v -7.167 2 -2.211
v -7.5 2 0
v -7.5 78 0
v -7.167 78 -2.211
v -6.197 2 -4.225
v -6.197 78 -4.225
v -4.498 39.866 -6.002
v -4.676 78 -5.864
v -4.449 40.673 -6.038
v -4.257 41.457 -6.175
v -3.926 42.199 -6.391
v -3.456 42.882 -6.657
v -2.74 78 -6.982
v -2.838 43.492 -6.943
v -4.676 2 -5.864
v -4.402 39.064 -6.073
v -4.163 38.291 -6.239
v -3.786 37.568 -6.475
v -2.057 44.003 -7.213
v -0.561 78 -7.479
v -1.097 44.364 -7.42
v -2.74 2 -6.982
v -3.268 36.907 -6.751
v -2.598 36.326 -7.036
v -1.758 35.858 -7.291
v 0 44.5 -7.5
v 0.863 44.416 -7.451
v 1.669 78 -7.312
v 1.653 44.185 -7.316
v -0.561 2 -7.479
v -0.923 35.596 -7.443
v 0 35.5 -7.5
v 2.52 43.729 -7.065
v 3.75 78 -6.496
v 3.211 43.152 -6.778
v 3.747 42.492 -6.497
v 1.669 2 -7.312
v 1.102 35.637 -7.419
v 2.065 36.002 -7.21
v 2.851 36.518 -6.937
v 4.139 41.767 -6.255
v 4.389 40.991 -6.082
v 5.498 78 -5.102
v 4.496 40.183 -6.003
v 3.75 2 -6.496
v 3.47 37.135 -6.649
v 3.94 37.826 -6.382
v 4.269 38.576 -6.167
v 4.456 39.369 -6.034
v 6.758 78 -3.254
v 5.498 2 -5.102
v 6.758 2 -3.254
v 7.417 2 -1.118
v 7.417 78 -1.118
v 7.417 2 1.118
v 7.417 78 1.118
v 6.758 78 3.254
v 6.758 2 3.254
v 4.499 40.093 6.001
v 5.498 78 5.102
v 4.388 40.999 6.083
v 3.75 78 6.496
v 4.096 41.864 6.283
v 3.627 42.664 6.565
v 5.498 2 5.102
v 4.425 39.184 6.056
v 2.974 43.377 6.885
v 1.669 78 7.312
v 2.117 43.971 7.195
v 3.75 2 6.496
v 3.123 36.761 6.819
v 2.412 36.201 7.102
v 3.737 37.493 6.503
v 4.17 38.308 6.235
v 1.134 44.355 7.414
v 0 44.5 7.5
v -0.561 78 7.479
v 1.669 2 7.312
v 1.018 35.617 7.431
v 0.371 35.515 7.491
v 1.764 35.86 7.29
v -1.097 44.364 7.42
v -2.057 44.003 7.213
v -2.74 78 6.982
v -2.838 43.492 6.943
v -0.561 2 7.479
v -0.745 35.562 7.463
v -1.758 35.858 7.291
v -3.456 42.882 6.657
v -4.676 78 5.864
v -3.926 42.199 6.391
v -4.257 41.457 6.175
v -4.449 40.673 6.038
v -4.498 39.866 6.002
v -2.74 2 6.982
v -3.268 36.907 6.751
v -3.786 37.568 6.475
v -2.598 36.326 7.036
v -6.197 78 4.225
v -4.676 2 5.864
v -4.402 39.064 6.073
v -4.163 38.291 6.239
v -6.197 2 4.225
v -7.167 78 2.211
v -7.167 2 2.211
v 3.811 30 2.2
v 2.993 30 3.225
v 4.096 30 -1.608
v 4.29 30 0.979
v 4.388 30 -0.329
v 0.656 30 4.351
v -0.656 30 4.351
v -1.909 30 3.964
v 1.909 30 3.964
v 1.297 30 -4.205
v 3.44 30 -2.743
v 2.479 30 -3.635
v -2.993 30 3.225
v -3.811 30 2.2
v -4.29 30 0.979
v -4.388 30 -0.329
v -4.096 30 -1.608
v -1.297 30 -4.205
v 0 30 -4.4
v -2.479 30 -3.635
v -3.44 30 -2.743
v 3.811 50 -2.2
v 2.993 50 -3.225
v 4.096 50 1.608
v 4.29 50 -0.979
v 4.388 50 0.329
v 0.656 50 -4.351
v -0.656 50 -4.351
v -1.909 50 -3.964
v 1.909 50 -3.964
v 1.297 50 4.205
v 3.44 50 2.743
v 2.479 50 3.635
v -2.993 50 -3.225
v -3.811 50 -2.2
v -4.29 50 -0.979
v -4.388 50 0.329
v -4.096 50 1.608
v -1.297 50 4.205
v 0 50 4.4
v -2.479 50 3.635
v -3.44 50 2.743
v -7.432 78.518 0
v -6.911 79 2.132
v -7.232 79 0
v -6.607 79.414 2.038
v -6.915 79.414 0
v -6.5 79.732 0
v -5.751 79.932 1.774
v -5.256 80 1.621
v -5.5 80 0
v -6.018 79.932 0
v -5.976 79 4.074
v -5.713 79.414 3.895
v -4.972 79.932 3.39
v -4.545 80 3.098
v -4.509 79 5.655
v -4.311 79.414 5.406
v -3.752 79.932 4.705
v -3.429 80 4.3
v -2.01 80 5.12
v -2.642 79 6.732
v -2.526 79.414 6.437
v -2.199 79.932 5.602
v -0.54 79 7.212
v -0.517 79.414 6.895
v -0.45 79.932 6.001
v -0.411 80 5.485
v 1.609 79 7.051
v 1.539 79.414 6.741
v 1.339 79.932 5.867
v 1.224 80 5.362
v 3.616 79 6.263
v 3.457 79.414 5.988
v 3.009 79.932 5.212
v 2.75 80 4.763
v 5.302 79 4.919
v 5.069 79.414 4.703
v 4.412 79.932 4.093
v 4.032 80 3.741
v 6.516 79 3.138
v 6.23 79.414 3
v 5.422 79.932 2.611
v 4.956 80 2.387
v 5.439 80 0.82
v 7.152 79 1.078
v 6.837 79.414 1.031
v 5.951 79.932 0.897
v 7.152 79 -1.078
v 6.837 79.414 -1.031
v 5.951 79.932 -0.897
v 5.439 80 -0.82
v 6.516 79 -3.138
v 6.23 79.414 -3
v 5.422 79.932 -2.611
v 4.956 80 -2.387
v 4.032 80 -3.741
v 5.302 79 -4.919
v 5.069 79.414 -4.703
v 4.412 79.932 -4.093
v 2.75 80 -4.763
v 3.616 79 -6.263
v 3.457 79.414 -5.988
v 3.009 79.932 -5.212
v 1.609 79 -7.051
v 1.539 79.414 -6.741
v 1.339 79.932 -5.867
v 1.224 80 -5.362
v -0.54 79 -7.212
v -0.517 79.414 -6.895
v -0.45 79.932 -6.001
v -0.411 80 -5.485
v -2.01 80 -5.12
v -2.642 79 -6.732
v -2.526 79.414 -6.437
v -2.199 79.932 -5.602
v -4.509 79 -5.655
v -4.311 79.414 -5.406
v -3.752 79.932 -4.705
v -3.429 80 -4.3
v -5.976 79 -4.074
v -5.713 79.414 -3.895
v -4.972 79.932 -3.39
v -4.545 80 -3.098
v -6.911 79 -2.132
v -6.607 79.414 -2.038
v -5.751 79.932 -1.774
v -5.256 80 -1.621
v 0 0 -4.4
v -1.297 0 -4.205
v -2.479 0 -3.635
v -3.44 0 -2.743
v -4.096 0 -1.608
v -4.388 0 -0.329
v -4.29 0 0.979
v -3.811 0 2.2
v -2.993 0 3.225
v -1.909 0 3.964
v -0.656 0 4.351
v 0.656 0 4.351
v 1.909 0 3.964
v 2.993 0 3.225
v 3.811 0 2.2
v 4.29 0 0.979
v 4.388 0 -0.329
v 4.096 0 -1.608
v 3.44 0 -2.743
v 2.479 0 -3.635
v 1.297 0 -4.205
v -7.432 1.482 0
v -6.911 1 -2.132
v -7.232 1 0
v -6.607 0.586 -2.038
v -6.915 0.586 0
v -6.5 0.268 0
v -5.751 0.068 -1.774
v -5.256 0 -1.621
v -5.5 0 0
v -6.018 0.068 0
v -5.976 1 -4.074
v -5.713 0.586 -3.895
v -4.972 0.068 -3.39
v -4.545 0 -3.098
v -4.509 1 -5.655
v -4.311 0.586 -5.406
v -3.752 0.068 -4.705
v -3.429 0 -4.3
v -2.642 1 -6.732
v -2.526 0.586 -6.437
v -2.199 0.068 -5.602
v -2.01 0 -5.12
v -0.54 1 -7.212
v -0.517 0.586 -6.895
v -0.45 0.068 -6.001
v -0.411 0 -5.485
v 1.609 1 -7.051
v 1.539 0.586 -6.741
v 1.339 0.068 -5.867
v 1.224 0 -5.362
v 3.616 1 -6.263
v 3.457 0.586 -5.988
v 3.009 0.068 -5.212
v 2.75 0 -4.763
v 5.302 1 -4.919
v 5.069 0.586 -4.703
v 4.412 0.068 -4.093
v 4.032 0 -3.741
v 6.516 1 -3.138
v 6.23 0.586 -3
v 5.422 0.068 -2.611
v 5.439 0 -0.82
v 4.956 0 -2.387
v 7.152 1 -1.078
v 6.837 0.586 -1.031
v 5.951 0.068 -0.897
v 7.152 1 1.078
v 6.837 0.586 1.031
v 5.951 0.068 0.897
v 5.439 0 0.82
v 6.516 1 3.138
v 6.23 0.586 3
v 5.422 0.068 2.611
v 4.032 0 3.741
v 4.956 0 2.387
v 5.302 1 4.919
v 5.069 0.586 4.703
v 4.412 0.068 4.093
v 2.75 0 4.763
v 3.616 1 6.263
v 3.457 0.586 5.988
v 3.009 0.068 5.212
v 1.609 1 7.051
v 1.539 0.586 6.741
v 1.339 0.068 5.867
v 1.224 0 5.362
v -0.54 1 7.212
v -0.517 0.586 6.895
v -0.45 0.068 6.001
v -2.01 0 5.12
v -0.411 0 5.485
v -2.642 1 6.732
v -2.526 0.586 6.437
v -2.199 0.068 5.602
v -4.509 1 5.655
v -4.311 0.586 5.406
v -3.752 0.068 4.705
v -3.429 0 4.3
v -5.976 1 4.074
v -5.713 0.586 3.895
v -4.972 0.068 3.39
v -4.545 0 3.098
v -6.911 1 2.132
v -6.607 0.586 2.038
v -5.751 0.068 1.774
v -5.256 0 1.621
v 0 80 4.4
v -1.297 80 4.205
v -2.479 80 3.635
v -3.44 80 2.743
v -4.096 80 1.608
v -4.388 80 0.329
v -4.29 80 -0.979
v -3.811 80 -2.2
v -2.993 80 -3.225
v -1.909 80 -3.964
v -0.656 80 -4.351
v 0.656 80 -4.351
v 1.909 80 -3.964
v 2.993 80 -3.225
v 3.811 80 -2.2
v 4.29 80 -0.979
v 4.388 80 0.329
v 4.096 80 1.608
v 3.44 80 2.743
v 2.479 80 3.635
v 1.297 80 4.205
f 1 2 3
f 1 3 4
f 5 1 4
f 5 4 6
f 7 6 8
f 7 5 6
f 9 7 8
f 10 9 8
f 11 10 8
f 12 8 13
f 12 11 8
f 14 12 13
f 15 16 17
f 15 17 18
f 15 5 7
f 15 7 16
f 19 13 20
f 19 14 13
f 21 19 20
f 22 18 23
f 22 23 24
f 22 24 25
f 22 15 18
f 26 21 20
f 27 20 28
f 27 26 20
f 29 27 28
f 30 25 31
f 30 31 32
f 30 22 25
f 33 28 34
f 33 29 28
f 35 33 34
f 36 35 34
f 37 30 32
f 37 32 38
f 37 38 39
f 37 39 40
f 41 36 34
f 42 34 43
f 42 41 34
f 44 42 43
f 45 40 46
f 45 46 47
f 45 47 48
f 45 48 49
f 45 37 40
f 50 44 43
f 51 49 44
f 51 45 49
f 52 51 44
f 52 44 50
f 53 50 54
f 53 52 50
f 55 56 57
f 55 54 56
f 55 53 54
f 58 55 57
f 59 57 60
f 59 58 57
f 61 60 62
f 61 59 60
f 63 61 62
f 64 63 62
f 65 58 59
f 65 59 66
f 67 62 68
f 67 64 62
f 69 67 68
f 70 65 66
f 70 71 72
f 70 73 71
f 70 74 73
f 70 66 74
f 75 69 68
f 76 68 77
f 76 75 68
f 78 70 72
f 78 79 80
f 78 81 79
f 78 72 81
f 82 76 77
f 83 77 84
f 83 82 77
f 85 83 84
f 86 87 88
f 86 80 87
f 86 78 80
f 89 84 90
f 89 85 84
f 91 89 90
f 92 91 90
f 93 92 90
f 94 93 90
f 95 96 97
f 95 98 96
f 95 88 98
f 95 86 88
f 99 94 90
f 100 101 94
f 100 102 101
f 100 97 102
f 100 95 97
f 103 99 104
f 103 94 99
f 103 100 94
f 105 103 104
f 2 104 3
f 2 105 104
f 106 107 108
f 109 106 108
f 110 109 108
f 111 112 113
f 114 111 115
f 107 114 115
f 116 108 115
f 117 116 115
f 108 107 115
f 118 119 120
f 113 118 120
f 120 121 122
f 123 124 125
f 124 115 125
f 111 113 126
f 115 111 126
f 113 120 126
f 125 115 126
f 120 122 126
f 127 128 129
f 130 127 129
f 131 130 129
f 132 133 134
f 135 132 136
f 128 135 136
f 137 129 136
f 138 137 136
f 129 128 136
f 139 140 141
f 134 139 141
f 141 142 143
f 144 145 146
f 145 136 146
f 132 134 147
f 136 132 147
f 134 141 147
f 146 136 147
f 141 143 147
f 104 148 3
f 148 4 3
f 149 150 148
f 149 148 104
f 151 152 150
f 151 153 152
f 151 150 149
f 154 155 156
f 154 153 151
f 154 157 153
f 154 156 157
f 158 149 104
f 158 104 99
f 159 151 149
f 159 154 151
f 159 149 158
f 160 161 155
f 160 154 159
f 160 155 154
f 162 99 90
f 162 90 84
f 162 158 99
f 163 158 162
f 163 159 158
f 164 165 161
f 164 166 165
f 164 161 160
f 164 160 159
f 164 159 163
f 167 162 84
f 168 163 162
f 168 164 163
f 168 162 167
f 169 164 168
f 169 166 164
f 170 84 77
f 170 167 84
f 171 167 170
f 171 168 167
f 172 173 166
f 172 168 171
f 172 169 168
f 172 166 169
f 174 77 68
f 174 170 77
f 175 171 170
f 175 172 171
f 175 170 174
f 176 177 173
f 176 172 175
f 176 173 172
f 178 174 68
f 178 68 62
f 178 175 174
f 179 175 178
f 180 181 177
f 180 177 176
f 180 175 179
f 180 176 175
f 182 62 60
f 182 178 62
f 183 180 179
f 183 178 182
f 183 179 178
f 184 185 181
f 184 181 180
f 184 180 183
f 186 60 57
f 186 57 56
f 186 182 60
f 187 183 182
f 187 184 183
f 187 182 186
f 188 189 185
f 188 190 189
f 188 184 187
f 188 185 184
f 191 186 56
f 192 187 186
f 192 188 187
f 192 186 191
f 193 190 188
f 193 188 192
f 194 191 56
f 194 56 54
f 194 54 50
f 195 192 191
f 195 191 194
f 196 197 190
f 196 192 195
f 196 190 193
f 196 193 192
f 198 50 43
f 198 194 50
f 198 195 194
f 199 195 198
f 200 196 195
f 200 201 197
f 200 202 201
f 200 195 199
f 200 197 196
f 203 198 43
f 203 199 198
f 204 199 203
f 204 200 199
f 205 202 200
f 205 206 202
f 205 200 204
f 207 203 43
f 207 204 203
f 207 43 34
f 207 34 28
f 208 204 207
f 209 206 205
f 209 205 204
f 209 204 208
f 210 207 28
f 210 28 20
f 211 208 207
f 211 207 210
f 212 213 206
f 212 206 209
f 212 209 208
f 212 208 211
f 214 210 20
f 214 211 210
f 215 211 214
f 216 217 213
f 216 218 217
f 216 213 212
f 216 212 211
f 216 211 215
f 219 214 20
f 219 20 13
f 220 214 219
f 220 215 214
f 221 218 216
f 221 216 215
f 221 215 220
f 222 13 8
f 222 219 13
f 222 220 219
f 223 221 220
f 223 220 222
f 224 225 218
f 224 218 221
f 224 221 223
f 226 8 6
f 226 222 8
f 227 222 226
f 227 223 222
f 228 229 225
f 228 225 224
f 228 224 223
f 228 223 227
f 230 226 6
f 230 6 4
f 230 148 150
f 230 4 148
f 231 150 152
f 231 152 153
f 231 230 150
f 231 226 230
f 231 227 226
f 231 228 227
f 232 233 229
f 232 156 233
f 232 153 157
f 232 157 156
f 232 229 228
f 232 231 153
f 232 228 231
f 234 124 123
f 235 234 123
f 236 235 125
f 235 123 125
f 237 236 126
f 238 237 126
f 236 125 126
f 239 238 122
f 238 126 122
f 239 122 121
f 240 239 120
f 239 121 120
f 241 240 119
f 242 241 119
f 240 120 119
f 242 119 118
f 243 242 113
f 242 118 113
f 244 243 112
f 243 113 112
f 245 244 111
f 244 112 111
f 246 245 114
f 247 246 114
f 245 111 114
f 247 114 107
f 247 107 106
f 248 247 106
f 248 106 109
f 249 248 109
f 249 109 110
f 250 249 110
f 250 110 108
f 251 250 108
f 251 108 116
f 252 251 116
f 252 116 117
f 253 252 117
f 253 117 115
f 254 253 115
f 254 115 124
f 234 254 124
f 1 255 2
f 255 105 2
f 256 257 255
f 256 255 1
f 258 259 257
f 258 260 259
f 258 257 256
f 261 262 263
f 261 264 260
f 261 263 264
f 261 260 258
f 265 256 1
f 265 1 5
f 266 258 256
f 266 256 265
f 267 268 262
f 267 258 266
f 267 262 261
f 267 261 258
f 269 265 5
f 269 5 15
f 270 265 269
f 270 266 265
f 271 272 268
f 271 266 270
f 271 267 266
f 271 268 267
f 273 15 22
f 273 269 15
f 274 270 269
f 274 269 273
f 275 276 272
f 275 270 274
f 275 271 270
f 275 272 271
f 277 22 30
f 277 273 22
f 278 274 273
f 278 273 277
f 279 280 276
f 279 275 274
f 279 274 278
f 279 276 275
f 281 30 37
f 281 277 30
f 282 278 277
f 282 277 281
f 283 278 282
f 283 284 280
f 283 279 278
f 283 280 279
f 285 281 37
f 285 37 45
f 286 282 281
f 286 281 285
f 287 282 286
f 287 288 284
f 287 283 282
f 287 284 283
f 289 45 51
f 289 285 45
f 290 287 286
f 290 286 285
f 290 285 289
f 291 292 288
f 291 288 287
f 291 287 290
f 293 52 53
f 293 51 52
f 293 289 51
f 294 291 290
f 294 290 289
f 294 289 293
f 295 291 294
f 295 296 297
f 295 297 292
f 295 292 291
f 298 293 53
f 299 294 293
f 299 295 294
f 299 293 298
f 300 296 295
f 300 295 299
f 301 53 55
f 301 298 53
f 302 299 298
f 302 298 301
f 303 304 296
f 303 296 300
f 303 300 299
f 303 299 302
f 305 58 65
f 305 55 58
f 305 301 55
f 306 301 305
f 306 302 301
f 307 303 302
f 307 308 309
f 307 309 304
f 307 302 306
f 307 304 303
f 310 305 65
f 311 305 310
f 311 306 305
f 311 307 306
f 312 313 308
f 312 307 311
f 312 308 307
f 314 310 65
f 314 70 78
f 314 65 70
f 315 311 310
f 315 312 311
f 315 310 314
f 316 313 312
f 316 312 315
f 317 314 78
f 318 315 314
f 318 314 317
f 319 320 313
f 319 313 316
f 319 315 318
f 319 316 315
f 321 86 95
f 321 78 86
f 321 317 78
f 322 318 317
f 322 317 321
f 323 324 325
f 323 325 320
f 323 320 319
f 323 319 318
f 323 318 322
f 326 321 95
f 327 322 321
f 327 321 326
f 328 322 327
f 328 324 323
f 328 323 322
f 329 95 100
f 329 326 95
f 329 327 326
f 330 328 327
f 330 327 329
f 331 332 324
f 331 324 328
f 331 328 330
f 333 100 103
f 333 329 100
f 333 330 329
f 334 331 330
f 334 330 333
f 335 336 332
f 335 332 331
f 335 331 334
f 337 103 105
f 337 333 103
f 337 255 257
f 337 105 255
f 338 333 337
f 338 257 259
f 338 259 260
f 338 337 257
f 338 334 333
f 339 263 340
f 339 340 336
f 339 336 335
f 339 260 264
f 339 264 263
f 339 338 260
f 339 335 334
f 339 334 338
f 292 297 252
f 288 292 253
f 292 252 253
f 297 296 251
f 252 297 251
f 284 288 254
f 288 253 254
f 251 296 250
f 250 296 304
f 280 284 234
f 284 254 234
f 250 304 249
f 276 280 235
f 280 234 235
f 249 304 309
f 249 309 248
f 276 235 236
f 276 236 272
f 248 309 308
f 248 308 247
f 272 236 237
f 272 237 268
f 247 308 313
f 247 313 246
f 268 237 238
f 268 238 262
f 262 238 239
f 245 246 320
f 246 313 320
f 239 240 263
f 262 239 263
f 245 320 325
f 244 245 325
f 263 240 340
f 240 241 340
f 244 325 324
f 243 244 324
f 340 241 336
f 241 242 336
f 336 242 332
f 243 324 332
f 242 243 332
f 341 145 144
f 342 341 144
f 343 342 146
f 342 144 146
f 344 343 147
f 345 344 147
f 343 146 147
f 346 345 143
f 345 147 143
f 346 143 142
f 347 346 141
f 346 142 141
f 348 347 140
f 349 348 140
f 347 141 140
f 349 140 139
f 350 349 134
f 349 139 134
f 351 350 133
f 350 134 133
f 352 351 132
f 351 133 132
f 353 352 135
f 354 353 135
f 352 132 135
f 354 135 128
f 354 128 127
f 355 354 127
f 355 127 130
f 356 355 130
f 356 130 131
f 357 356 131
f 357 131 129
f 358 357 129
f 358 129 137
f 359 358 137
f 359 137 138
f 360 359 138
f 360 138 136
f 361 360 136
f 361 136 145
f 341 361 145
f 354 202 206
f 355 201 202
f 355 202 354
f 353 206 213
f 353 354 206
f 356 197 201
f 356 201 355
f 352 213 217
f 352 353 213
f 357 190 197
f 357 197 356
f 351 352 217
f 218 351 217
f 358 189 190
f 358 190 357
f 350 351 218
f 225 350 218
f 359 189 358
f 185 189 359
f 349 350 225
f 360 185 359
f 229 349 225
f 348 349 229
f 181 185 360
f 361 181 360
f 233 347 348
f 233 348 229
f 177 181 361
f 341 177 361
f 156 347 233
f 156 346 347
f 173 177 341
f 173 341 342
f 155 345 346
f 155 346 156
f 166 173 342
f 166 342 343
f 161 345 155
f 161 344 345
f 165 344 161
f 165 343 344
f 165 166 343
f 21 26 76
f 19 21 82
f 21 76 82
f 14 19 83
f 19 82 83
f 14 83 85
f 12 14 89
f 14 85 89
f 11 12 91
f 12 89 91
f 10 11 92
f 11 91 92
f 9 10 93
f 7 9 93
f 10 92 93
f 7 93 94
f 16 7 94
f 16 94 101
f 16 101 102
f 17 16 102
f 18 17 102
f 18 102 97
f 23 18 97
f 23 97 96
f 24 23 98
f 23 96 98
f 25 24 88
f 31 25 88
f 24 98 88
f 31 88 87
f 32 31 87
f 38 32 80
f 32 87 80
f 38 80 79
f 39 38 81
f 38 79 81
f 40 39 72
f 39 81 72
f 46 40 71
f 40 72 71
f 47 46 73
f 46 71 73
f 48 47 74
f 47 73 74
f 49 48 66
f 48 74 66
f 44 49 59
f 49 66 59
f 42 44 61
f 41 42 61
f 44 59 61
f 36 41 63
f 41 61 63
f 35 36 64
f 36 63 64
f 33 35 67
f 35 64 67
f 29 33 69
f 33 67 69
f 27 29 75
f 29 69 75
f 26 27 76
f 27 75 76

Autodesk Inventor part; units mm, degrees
ref_plane "YZ Plane" through (0, 0, 0) normal (1, 0, 0) x (0, 1, 0)
ref_plane "XZ Plane" through (0, 0, 0) normal (0, 1, 0) x (-1, 0, 0)
sketch "Sketch1" plane through (0, 0, 0) normal (0, 1, 0) x (-1, 0, 0)
  circle A0 centre (0, 0) radius 7.5004
extrude "Extrusion1" add sketch "Sketch1" along normal blind 80
sketch "Sketch2" plane through (0, 80, 0) normal (0, 1, 0) x (1, 0, 0)
  point P0 (0, 0)
hole "Hole1" at (0, 80, 0) direction (0, -1, 0) diameter 8.8 depth 30
thread "Thread1" size "M9x1.25" class "6H" standard "ISO Metric profile" length 30
hole "Hole2" at (0, 0, 0) direction (0, 1, 0) diameter 8.8 depth 30
sketch "Sketch6" plane through (0, 0, 0) normal (1, 0, 0) x (0, 1, 0)
  line L0 (0, -7.5004) -> (0, 7.5004) projected
  line L1 (0, -7.5004) -> (40, -7.5004)
  line L2 (0, -7.5004) -> (80, -7.5004) projected
  point P0 (0, 0)
ref_plane "Work Plane1" through (0, 0, -7.5004) normal (0, 0, -1) x (-1, 0, 0)
sketch "Sketch7" plane through (0, 0, -7.5004) normal (0, 0, -1) x (-1, 0, 0)
  line L0 (0, 0) -> (0, 40)
  circle A0 centre (0, 40) radius 4.4
  dimension "d22" = 40
  dimension "d23" = 8.8
hole "Hole3" at (0, 40, -7.5004) direction (0, 0, 1) diameter 9 end through all
thread "Thread3" size "M9x1.25" class "6H" standard "ANSI Metric M Profile" length 30
thread "Thread4" size "M9x1.25" class "6H" standard "ANSI Metric M Profile" length 30
fillet "Fillet1" radius 2 2 edges at (7.5004, 0, 0) (7.5004, 80, 0)
properties part number "_3DPrint"
